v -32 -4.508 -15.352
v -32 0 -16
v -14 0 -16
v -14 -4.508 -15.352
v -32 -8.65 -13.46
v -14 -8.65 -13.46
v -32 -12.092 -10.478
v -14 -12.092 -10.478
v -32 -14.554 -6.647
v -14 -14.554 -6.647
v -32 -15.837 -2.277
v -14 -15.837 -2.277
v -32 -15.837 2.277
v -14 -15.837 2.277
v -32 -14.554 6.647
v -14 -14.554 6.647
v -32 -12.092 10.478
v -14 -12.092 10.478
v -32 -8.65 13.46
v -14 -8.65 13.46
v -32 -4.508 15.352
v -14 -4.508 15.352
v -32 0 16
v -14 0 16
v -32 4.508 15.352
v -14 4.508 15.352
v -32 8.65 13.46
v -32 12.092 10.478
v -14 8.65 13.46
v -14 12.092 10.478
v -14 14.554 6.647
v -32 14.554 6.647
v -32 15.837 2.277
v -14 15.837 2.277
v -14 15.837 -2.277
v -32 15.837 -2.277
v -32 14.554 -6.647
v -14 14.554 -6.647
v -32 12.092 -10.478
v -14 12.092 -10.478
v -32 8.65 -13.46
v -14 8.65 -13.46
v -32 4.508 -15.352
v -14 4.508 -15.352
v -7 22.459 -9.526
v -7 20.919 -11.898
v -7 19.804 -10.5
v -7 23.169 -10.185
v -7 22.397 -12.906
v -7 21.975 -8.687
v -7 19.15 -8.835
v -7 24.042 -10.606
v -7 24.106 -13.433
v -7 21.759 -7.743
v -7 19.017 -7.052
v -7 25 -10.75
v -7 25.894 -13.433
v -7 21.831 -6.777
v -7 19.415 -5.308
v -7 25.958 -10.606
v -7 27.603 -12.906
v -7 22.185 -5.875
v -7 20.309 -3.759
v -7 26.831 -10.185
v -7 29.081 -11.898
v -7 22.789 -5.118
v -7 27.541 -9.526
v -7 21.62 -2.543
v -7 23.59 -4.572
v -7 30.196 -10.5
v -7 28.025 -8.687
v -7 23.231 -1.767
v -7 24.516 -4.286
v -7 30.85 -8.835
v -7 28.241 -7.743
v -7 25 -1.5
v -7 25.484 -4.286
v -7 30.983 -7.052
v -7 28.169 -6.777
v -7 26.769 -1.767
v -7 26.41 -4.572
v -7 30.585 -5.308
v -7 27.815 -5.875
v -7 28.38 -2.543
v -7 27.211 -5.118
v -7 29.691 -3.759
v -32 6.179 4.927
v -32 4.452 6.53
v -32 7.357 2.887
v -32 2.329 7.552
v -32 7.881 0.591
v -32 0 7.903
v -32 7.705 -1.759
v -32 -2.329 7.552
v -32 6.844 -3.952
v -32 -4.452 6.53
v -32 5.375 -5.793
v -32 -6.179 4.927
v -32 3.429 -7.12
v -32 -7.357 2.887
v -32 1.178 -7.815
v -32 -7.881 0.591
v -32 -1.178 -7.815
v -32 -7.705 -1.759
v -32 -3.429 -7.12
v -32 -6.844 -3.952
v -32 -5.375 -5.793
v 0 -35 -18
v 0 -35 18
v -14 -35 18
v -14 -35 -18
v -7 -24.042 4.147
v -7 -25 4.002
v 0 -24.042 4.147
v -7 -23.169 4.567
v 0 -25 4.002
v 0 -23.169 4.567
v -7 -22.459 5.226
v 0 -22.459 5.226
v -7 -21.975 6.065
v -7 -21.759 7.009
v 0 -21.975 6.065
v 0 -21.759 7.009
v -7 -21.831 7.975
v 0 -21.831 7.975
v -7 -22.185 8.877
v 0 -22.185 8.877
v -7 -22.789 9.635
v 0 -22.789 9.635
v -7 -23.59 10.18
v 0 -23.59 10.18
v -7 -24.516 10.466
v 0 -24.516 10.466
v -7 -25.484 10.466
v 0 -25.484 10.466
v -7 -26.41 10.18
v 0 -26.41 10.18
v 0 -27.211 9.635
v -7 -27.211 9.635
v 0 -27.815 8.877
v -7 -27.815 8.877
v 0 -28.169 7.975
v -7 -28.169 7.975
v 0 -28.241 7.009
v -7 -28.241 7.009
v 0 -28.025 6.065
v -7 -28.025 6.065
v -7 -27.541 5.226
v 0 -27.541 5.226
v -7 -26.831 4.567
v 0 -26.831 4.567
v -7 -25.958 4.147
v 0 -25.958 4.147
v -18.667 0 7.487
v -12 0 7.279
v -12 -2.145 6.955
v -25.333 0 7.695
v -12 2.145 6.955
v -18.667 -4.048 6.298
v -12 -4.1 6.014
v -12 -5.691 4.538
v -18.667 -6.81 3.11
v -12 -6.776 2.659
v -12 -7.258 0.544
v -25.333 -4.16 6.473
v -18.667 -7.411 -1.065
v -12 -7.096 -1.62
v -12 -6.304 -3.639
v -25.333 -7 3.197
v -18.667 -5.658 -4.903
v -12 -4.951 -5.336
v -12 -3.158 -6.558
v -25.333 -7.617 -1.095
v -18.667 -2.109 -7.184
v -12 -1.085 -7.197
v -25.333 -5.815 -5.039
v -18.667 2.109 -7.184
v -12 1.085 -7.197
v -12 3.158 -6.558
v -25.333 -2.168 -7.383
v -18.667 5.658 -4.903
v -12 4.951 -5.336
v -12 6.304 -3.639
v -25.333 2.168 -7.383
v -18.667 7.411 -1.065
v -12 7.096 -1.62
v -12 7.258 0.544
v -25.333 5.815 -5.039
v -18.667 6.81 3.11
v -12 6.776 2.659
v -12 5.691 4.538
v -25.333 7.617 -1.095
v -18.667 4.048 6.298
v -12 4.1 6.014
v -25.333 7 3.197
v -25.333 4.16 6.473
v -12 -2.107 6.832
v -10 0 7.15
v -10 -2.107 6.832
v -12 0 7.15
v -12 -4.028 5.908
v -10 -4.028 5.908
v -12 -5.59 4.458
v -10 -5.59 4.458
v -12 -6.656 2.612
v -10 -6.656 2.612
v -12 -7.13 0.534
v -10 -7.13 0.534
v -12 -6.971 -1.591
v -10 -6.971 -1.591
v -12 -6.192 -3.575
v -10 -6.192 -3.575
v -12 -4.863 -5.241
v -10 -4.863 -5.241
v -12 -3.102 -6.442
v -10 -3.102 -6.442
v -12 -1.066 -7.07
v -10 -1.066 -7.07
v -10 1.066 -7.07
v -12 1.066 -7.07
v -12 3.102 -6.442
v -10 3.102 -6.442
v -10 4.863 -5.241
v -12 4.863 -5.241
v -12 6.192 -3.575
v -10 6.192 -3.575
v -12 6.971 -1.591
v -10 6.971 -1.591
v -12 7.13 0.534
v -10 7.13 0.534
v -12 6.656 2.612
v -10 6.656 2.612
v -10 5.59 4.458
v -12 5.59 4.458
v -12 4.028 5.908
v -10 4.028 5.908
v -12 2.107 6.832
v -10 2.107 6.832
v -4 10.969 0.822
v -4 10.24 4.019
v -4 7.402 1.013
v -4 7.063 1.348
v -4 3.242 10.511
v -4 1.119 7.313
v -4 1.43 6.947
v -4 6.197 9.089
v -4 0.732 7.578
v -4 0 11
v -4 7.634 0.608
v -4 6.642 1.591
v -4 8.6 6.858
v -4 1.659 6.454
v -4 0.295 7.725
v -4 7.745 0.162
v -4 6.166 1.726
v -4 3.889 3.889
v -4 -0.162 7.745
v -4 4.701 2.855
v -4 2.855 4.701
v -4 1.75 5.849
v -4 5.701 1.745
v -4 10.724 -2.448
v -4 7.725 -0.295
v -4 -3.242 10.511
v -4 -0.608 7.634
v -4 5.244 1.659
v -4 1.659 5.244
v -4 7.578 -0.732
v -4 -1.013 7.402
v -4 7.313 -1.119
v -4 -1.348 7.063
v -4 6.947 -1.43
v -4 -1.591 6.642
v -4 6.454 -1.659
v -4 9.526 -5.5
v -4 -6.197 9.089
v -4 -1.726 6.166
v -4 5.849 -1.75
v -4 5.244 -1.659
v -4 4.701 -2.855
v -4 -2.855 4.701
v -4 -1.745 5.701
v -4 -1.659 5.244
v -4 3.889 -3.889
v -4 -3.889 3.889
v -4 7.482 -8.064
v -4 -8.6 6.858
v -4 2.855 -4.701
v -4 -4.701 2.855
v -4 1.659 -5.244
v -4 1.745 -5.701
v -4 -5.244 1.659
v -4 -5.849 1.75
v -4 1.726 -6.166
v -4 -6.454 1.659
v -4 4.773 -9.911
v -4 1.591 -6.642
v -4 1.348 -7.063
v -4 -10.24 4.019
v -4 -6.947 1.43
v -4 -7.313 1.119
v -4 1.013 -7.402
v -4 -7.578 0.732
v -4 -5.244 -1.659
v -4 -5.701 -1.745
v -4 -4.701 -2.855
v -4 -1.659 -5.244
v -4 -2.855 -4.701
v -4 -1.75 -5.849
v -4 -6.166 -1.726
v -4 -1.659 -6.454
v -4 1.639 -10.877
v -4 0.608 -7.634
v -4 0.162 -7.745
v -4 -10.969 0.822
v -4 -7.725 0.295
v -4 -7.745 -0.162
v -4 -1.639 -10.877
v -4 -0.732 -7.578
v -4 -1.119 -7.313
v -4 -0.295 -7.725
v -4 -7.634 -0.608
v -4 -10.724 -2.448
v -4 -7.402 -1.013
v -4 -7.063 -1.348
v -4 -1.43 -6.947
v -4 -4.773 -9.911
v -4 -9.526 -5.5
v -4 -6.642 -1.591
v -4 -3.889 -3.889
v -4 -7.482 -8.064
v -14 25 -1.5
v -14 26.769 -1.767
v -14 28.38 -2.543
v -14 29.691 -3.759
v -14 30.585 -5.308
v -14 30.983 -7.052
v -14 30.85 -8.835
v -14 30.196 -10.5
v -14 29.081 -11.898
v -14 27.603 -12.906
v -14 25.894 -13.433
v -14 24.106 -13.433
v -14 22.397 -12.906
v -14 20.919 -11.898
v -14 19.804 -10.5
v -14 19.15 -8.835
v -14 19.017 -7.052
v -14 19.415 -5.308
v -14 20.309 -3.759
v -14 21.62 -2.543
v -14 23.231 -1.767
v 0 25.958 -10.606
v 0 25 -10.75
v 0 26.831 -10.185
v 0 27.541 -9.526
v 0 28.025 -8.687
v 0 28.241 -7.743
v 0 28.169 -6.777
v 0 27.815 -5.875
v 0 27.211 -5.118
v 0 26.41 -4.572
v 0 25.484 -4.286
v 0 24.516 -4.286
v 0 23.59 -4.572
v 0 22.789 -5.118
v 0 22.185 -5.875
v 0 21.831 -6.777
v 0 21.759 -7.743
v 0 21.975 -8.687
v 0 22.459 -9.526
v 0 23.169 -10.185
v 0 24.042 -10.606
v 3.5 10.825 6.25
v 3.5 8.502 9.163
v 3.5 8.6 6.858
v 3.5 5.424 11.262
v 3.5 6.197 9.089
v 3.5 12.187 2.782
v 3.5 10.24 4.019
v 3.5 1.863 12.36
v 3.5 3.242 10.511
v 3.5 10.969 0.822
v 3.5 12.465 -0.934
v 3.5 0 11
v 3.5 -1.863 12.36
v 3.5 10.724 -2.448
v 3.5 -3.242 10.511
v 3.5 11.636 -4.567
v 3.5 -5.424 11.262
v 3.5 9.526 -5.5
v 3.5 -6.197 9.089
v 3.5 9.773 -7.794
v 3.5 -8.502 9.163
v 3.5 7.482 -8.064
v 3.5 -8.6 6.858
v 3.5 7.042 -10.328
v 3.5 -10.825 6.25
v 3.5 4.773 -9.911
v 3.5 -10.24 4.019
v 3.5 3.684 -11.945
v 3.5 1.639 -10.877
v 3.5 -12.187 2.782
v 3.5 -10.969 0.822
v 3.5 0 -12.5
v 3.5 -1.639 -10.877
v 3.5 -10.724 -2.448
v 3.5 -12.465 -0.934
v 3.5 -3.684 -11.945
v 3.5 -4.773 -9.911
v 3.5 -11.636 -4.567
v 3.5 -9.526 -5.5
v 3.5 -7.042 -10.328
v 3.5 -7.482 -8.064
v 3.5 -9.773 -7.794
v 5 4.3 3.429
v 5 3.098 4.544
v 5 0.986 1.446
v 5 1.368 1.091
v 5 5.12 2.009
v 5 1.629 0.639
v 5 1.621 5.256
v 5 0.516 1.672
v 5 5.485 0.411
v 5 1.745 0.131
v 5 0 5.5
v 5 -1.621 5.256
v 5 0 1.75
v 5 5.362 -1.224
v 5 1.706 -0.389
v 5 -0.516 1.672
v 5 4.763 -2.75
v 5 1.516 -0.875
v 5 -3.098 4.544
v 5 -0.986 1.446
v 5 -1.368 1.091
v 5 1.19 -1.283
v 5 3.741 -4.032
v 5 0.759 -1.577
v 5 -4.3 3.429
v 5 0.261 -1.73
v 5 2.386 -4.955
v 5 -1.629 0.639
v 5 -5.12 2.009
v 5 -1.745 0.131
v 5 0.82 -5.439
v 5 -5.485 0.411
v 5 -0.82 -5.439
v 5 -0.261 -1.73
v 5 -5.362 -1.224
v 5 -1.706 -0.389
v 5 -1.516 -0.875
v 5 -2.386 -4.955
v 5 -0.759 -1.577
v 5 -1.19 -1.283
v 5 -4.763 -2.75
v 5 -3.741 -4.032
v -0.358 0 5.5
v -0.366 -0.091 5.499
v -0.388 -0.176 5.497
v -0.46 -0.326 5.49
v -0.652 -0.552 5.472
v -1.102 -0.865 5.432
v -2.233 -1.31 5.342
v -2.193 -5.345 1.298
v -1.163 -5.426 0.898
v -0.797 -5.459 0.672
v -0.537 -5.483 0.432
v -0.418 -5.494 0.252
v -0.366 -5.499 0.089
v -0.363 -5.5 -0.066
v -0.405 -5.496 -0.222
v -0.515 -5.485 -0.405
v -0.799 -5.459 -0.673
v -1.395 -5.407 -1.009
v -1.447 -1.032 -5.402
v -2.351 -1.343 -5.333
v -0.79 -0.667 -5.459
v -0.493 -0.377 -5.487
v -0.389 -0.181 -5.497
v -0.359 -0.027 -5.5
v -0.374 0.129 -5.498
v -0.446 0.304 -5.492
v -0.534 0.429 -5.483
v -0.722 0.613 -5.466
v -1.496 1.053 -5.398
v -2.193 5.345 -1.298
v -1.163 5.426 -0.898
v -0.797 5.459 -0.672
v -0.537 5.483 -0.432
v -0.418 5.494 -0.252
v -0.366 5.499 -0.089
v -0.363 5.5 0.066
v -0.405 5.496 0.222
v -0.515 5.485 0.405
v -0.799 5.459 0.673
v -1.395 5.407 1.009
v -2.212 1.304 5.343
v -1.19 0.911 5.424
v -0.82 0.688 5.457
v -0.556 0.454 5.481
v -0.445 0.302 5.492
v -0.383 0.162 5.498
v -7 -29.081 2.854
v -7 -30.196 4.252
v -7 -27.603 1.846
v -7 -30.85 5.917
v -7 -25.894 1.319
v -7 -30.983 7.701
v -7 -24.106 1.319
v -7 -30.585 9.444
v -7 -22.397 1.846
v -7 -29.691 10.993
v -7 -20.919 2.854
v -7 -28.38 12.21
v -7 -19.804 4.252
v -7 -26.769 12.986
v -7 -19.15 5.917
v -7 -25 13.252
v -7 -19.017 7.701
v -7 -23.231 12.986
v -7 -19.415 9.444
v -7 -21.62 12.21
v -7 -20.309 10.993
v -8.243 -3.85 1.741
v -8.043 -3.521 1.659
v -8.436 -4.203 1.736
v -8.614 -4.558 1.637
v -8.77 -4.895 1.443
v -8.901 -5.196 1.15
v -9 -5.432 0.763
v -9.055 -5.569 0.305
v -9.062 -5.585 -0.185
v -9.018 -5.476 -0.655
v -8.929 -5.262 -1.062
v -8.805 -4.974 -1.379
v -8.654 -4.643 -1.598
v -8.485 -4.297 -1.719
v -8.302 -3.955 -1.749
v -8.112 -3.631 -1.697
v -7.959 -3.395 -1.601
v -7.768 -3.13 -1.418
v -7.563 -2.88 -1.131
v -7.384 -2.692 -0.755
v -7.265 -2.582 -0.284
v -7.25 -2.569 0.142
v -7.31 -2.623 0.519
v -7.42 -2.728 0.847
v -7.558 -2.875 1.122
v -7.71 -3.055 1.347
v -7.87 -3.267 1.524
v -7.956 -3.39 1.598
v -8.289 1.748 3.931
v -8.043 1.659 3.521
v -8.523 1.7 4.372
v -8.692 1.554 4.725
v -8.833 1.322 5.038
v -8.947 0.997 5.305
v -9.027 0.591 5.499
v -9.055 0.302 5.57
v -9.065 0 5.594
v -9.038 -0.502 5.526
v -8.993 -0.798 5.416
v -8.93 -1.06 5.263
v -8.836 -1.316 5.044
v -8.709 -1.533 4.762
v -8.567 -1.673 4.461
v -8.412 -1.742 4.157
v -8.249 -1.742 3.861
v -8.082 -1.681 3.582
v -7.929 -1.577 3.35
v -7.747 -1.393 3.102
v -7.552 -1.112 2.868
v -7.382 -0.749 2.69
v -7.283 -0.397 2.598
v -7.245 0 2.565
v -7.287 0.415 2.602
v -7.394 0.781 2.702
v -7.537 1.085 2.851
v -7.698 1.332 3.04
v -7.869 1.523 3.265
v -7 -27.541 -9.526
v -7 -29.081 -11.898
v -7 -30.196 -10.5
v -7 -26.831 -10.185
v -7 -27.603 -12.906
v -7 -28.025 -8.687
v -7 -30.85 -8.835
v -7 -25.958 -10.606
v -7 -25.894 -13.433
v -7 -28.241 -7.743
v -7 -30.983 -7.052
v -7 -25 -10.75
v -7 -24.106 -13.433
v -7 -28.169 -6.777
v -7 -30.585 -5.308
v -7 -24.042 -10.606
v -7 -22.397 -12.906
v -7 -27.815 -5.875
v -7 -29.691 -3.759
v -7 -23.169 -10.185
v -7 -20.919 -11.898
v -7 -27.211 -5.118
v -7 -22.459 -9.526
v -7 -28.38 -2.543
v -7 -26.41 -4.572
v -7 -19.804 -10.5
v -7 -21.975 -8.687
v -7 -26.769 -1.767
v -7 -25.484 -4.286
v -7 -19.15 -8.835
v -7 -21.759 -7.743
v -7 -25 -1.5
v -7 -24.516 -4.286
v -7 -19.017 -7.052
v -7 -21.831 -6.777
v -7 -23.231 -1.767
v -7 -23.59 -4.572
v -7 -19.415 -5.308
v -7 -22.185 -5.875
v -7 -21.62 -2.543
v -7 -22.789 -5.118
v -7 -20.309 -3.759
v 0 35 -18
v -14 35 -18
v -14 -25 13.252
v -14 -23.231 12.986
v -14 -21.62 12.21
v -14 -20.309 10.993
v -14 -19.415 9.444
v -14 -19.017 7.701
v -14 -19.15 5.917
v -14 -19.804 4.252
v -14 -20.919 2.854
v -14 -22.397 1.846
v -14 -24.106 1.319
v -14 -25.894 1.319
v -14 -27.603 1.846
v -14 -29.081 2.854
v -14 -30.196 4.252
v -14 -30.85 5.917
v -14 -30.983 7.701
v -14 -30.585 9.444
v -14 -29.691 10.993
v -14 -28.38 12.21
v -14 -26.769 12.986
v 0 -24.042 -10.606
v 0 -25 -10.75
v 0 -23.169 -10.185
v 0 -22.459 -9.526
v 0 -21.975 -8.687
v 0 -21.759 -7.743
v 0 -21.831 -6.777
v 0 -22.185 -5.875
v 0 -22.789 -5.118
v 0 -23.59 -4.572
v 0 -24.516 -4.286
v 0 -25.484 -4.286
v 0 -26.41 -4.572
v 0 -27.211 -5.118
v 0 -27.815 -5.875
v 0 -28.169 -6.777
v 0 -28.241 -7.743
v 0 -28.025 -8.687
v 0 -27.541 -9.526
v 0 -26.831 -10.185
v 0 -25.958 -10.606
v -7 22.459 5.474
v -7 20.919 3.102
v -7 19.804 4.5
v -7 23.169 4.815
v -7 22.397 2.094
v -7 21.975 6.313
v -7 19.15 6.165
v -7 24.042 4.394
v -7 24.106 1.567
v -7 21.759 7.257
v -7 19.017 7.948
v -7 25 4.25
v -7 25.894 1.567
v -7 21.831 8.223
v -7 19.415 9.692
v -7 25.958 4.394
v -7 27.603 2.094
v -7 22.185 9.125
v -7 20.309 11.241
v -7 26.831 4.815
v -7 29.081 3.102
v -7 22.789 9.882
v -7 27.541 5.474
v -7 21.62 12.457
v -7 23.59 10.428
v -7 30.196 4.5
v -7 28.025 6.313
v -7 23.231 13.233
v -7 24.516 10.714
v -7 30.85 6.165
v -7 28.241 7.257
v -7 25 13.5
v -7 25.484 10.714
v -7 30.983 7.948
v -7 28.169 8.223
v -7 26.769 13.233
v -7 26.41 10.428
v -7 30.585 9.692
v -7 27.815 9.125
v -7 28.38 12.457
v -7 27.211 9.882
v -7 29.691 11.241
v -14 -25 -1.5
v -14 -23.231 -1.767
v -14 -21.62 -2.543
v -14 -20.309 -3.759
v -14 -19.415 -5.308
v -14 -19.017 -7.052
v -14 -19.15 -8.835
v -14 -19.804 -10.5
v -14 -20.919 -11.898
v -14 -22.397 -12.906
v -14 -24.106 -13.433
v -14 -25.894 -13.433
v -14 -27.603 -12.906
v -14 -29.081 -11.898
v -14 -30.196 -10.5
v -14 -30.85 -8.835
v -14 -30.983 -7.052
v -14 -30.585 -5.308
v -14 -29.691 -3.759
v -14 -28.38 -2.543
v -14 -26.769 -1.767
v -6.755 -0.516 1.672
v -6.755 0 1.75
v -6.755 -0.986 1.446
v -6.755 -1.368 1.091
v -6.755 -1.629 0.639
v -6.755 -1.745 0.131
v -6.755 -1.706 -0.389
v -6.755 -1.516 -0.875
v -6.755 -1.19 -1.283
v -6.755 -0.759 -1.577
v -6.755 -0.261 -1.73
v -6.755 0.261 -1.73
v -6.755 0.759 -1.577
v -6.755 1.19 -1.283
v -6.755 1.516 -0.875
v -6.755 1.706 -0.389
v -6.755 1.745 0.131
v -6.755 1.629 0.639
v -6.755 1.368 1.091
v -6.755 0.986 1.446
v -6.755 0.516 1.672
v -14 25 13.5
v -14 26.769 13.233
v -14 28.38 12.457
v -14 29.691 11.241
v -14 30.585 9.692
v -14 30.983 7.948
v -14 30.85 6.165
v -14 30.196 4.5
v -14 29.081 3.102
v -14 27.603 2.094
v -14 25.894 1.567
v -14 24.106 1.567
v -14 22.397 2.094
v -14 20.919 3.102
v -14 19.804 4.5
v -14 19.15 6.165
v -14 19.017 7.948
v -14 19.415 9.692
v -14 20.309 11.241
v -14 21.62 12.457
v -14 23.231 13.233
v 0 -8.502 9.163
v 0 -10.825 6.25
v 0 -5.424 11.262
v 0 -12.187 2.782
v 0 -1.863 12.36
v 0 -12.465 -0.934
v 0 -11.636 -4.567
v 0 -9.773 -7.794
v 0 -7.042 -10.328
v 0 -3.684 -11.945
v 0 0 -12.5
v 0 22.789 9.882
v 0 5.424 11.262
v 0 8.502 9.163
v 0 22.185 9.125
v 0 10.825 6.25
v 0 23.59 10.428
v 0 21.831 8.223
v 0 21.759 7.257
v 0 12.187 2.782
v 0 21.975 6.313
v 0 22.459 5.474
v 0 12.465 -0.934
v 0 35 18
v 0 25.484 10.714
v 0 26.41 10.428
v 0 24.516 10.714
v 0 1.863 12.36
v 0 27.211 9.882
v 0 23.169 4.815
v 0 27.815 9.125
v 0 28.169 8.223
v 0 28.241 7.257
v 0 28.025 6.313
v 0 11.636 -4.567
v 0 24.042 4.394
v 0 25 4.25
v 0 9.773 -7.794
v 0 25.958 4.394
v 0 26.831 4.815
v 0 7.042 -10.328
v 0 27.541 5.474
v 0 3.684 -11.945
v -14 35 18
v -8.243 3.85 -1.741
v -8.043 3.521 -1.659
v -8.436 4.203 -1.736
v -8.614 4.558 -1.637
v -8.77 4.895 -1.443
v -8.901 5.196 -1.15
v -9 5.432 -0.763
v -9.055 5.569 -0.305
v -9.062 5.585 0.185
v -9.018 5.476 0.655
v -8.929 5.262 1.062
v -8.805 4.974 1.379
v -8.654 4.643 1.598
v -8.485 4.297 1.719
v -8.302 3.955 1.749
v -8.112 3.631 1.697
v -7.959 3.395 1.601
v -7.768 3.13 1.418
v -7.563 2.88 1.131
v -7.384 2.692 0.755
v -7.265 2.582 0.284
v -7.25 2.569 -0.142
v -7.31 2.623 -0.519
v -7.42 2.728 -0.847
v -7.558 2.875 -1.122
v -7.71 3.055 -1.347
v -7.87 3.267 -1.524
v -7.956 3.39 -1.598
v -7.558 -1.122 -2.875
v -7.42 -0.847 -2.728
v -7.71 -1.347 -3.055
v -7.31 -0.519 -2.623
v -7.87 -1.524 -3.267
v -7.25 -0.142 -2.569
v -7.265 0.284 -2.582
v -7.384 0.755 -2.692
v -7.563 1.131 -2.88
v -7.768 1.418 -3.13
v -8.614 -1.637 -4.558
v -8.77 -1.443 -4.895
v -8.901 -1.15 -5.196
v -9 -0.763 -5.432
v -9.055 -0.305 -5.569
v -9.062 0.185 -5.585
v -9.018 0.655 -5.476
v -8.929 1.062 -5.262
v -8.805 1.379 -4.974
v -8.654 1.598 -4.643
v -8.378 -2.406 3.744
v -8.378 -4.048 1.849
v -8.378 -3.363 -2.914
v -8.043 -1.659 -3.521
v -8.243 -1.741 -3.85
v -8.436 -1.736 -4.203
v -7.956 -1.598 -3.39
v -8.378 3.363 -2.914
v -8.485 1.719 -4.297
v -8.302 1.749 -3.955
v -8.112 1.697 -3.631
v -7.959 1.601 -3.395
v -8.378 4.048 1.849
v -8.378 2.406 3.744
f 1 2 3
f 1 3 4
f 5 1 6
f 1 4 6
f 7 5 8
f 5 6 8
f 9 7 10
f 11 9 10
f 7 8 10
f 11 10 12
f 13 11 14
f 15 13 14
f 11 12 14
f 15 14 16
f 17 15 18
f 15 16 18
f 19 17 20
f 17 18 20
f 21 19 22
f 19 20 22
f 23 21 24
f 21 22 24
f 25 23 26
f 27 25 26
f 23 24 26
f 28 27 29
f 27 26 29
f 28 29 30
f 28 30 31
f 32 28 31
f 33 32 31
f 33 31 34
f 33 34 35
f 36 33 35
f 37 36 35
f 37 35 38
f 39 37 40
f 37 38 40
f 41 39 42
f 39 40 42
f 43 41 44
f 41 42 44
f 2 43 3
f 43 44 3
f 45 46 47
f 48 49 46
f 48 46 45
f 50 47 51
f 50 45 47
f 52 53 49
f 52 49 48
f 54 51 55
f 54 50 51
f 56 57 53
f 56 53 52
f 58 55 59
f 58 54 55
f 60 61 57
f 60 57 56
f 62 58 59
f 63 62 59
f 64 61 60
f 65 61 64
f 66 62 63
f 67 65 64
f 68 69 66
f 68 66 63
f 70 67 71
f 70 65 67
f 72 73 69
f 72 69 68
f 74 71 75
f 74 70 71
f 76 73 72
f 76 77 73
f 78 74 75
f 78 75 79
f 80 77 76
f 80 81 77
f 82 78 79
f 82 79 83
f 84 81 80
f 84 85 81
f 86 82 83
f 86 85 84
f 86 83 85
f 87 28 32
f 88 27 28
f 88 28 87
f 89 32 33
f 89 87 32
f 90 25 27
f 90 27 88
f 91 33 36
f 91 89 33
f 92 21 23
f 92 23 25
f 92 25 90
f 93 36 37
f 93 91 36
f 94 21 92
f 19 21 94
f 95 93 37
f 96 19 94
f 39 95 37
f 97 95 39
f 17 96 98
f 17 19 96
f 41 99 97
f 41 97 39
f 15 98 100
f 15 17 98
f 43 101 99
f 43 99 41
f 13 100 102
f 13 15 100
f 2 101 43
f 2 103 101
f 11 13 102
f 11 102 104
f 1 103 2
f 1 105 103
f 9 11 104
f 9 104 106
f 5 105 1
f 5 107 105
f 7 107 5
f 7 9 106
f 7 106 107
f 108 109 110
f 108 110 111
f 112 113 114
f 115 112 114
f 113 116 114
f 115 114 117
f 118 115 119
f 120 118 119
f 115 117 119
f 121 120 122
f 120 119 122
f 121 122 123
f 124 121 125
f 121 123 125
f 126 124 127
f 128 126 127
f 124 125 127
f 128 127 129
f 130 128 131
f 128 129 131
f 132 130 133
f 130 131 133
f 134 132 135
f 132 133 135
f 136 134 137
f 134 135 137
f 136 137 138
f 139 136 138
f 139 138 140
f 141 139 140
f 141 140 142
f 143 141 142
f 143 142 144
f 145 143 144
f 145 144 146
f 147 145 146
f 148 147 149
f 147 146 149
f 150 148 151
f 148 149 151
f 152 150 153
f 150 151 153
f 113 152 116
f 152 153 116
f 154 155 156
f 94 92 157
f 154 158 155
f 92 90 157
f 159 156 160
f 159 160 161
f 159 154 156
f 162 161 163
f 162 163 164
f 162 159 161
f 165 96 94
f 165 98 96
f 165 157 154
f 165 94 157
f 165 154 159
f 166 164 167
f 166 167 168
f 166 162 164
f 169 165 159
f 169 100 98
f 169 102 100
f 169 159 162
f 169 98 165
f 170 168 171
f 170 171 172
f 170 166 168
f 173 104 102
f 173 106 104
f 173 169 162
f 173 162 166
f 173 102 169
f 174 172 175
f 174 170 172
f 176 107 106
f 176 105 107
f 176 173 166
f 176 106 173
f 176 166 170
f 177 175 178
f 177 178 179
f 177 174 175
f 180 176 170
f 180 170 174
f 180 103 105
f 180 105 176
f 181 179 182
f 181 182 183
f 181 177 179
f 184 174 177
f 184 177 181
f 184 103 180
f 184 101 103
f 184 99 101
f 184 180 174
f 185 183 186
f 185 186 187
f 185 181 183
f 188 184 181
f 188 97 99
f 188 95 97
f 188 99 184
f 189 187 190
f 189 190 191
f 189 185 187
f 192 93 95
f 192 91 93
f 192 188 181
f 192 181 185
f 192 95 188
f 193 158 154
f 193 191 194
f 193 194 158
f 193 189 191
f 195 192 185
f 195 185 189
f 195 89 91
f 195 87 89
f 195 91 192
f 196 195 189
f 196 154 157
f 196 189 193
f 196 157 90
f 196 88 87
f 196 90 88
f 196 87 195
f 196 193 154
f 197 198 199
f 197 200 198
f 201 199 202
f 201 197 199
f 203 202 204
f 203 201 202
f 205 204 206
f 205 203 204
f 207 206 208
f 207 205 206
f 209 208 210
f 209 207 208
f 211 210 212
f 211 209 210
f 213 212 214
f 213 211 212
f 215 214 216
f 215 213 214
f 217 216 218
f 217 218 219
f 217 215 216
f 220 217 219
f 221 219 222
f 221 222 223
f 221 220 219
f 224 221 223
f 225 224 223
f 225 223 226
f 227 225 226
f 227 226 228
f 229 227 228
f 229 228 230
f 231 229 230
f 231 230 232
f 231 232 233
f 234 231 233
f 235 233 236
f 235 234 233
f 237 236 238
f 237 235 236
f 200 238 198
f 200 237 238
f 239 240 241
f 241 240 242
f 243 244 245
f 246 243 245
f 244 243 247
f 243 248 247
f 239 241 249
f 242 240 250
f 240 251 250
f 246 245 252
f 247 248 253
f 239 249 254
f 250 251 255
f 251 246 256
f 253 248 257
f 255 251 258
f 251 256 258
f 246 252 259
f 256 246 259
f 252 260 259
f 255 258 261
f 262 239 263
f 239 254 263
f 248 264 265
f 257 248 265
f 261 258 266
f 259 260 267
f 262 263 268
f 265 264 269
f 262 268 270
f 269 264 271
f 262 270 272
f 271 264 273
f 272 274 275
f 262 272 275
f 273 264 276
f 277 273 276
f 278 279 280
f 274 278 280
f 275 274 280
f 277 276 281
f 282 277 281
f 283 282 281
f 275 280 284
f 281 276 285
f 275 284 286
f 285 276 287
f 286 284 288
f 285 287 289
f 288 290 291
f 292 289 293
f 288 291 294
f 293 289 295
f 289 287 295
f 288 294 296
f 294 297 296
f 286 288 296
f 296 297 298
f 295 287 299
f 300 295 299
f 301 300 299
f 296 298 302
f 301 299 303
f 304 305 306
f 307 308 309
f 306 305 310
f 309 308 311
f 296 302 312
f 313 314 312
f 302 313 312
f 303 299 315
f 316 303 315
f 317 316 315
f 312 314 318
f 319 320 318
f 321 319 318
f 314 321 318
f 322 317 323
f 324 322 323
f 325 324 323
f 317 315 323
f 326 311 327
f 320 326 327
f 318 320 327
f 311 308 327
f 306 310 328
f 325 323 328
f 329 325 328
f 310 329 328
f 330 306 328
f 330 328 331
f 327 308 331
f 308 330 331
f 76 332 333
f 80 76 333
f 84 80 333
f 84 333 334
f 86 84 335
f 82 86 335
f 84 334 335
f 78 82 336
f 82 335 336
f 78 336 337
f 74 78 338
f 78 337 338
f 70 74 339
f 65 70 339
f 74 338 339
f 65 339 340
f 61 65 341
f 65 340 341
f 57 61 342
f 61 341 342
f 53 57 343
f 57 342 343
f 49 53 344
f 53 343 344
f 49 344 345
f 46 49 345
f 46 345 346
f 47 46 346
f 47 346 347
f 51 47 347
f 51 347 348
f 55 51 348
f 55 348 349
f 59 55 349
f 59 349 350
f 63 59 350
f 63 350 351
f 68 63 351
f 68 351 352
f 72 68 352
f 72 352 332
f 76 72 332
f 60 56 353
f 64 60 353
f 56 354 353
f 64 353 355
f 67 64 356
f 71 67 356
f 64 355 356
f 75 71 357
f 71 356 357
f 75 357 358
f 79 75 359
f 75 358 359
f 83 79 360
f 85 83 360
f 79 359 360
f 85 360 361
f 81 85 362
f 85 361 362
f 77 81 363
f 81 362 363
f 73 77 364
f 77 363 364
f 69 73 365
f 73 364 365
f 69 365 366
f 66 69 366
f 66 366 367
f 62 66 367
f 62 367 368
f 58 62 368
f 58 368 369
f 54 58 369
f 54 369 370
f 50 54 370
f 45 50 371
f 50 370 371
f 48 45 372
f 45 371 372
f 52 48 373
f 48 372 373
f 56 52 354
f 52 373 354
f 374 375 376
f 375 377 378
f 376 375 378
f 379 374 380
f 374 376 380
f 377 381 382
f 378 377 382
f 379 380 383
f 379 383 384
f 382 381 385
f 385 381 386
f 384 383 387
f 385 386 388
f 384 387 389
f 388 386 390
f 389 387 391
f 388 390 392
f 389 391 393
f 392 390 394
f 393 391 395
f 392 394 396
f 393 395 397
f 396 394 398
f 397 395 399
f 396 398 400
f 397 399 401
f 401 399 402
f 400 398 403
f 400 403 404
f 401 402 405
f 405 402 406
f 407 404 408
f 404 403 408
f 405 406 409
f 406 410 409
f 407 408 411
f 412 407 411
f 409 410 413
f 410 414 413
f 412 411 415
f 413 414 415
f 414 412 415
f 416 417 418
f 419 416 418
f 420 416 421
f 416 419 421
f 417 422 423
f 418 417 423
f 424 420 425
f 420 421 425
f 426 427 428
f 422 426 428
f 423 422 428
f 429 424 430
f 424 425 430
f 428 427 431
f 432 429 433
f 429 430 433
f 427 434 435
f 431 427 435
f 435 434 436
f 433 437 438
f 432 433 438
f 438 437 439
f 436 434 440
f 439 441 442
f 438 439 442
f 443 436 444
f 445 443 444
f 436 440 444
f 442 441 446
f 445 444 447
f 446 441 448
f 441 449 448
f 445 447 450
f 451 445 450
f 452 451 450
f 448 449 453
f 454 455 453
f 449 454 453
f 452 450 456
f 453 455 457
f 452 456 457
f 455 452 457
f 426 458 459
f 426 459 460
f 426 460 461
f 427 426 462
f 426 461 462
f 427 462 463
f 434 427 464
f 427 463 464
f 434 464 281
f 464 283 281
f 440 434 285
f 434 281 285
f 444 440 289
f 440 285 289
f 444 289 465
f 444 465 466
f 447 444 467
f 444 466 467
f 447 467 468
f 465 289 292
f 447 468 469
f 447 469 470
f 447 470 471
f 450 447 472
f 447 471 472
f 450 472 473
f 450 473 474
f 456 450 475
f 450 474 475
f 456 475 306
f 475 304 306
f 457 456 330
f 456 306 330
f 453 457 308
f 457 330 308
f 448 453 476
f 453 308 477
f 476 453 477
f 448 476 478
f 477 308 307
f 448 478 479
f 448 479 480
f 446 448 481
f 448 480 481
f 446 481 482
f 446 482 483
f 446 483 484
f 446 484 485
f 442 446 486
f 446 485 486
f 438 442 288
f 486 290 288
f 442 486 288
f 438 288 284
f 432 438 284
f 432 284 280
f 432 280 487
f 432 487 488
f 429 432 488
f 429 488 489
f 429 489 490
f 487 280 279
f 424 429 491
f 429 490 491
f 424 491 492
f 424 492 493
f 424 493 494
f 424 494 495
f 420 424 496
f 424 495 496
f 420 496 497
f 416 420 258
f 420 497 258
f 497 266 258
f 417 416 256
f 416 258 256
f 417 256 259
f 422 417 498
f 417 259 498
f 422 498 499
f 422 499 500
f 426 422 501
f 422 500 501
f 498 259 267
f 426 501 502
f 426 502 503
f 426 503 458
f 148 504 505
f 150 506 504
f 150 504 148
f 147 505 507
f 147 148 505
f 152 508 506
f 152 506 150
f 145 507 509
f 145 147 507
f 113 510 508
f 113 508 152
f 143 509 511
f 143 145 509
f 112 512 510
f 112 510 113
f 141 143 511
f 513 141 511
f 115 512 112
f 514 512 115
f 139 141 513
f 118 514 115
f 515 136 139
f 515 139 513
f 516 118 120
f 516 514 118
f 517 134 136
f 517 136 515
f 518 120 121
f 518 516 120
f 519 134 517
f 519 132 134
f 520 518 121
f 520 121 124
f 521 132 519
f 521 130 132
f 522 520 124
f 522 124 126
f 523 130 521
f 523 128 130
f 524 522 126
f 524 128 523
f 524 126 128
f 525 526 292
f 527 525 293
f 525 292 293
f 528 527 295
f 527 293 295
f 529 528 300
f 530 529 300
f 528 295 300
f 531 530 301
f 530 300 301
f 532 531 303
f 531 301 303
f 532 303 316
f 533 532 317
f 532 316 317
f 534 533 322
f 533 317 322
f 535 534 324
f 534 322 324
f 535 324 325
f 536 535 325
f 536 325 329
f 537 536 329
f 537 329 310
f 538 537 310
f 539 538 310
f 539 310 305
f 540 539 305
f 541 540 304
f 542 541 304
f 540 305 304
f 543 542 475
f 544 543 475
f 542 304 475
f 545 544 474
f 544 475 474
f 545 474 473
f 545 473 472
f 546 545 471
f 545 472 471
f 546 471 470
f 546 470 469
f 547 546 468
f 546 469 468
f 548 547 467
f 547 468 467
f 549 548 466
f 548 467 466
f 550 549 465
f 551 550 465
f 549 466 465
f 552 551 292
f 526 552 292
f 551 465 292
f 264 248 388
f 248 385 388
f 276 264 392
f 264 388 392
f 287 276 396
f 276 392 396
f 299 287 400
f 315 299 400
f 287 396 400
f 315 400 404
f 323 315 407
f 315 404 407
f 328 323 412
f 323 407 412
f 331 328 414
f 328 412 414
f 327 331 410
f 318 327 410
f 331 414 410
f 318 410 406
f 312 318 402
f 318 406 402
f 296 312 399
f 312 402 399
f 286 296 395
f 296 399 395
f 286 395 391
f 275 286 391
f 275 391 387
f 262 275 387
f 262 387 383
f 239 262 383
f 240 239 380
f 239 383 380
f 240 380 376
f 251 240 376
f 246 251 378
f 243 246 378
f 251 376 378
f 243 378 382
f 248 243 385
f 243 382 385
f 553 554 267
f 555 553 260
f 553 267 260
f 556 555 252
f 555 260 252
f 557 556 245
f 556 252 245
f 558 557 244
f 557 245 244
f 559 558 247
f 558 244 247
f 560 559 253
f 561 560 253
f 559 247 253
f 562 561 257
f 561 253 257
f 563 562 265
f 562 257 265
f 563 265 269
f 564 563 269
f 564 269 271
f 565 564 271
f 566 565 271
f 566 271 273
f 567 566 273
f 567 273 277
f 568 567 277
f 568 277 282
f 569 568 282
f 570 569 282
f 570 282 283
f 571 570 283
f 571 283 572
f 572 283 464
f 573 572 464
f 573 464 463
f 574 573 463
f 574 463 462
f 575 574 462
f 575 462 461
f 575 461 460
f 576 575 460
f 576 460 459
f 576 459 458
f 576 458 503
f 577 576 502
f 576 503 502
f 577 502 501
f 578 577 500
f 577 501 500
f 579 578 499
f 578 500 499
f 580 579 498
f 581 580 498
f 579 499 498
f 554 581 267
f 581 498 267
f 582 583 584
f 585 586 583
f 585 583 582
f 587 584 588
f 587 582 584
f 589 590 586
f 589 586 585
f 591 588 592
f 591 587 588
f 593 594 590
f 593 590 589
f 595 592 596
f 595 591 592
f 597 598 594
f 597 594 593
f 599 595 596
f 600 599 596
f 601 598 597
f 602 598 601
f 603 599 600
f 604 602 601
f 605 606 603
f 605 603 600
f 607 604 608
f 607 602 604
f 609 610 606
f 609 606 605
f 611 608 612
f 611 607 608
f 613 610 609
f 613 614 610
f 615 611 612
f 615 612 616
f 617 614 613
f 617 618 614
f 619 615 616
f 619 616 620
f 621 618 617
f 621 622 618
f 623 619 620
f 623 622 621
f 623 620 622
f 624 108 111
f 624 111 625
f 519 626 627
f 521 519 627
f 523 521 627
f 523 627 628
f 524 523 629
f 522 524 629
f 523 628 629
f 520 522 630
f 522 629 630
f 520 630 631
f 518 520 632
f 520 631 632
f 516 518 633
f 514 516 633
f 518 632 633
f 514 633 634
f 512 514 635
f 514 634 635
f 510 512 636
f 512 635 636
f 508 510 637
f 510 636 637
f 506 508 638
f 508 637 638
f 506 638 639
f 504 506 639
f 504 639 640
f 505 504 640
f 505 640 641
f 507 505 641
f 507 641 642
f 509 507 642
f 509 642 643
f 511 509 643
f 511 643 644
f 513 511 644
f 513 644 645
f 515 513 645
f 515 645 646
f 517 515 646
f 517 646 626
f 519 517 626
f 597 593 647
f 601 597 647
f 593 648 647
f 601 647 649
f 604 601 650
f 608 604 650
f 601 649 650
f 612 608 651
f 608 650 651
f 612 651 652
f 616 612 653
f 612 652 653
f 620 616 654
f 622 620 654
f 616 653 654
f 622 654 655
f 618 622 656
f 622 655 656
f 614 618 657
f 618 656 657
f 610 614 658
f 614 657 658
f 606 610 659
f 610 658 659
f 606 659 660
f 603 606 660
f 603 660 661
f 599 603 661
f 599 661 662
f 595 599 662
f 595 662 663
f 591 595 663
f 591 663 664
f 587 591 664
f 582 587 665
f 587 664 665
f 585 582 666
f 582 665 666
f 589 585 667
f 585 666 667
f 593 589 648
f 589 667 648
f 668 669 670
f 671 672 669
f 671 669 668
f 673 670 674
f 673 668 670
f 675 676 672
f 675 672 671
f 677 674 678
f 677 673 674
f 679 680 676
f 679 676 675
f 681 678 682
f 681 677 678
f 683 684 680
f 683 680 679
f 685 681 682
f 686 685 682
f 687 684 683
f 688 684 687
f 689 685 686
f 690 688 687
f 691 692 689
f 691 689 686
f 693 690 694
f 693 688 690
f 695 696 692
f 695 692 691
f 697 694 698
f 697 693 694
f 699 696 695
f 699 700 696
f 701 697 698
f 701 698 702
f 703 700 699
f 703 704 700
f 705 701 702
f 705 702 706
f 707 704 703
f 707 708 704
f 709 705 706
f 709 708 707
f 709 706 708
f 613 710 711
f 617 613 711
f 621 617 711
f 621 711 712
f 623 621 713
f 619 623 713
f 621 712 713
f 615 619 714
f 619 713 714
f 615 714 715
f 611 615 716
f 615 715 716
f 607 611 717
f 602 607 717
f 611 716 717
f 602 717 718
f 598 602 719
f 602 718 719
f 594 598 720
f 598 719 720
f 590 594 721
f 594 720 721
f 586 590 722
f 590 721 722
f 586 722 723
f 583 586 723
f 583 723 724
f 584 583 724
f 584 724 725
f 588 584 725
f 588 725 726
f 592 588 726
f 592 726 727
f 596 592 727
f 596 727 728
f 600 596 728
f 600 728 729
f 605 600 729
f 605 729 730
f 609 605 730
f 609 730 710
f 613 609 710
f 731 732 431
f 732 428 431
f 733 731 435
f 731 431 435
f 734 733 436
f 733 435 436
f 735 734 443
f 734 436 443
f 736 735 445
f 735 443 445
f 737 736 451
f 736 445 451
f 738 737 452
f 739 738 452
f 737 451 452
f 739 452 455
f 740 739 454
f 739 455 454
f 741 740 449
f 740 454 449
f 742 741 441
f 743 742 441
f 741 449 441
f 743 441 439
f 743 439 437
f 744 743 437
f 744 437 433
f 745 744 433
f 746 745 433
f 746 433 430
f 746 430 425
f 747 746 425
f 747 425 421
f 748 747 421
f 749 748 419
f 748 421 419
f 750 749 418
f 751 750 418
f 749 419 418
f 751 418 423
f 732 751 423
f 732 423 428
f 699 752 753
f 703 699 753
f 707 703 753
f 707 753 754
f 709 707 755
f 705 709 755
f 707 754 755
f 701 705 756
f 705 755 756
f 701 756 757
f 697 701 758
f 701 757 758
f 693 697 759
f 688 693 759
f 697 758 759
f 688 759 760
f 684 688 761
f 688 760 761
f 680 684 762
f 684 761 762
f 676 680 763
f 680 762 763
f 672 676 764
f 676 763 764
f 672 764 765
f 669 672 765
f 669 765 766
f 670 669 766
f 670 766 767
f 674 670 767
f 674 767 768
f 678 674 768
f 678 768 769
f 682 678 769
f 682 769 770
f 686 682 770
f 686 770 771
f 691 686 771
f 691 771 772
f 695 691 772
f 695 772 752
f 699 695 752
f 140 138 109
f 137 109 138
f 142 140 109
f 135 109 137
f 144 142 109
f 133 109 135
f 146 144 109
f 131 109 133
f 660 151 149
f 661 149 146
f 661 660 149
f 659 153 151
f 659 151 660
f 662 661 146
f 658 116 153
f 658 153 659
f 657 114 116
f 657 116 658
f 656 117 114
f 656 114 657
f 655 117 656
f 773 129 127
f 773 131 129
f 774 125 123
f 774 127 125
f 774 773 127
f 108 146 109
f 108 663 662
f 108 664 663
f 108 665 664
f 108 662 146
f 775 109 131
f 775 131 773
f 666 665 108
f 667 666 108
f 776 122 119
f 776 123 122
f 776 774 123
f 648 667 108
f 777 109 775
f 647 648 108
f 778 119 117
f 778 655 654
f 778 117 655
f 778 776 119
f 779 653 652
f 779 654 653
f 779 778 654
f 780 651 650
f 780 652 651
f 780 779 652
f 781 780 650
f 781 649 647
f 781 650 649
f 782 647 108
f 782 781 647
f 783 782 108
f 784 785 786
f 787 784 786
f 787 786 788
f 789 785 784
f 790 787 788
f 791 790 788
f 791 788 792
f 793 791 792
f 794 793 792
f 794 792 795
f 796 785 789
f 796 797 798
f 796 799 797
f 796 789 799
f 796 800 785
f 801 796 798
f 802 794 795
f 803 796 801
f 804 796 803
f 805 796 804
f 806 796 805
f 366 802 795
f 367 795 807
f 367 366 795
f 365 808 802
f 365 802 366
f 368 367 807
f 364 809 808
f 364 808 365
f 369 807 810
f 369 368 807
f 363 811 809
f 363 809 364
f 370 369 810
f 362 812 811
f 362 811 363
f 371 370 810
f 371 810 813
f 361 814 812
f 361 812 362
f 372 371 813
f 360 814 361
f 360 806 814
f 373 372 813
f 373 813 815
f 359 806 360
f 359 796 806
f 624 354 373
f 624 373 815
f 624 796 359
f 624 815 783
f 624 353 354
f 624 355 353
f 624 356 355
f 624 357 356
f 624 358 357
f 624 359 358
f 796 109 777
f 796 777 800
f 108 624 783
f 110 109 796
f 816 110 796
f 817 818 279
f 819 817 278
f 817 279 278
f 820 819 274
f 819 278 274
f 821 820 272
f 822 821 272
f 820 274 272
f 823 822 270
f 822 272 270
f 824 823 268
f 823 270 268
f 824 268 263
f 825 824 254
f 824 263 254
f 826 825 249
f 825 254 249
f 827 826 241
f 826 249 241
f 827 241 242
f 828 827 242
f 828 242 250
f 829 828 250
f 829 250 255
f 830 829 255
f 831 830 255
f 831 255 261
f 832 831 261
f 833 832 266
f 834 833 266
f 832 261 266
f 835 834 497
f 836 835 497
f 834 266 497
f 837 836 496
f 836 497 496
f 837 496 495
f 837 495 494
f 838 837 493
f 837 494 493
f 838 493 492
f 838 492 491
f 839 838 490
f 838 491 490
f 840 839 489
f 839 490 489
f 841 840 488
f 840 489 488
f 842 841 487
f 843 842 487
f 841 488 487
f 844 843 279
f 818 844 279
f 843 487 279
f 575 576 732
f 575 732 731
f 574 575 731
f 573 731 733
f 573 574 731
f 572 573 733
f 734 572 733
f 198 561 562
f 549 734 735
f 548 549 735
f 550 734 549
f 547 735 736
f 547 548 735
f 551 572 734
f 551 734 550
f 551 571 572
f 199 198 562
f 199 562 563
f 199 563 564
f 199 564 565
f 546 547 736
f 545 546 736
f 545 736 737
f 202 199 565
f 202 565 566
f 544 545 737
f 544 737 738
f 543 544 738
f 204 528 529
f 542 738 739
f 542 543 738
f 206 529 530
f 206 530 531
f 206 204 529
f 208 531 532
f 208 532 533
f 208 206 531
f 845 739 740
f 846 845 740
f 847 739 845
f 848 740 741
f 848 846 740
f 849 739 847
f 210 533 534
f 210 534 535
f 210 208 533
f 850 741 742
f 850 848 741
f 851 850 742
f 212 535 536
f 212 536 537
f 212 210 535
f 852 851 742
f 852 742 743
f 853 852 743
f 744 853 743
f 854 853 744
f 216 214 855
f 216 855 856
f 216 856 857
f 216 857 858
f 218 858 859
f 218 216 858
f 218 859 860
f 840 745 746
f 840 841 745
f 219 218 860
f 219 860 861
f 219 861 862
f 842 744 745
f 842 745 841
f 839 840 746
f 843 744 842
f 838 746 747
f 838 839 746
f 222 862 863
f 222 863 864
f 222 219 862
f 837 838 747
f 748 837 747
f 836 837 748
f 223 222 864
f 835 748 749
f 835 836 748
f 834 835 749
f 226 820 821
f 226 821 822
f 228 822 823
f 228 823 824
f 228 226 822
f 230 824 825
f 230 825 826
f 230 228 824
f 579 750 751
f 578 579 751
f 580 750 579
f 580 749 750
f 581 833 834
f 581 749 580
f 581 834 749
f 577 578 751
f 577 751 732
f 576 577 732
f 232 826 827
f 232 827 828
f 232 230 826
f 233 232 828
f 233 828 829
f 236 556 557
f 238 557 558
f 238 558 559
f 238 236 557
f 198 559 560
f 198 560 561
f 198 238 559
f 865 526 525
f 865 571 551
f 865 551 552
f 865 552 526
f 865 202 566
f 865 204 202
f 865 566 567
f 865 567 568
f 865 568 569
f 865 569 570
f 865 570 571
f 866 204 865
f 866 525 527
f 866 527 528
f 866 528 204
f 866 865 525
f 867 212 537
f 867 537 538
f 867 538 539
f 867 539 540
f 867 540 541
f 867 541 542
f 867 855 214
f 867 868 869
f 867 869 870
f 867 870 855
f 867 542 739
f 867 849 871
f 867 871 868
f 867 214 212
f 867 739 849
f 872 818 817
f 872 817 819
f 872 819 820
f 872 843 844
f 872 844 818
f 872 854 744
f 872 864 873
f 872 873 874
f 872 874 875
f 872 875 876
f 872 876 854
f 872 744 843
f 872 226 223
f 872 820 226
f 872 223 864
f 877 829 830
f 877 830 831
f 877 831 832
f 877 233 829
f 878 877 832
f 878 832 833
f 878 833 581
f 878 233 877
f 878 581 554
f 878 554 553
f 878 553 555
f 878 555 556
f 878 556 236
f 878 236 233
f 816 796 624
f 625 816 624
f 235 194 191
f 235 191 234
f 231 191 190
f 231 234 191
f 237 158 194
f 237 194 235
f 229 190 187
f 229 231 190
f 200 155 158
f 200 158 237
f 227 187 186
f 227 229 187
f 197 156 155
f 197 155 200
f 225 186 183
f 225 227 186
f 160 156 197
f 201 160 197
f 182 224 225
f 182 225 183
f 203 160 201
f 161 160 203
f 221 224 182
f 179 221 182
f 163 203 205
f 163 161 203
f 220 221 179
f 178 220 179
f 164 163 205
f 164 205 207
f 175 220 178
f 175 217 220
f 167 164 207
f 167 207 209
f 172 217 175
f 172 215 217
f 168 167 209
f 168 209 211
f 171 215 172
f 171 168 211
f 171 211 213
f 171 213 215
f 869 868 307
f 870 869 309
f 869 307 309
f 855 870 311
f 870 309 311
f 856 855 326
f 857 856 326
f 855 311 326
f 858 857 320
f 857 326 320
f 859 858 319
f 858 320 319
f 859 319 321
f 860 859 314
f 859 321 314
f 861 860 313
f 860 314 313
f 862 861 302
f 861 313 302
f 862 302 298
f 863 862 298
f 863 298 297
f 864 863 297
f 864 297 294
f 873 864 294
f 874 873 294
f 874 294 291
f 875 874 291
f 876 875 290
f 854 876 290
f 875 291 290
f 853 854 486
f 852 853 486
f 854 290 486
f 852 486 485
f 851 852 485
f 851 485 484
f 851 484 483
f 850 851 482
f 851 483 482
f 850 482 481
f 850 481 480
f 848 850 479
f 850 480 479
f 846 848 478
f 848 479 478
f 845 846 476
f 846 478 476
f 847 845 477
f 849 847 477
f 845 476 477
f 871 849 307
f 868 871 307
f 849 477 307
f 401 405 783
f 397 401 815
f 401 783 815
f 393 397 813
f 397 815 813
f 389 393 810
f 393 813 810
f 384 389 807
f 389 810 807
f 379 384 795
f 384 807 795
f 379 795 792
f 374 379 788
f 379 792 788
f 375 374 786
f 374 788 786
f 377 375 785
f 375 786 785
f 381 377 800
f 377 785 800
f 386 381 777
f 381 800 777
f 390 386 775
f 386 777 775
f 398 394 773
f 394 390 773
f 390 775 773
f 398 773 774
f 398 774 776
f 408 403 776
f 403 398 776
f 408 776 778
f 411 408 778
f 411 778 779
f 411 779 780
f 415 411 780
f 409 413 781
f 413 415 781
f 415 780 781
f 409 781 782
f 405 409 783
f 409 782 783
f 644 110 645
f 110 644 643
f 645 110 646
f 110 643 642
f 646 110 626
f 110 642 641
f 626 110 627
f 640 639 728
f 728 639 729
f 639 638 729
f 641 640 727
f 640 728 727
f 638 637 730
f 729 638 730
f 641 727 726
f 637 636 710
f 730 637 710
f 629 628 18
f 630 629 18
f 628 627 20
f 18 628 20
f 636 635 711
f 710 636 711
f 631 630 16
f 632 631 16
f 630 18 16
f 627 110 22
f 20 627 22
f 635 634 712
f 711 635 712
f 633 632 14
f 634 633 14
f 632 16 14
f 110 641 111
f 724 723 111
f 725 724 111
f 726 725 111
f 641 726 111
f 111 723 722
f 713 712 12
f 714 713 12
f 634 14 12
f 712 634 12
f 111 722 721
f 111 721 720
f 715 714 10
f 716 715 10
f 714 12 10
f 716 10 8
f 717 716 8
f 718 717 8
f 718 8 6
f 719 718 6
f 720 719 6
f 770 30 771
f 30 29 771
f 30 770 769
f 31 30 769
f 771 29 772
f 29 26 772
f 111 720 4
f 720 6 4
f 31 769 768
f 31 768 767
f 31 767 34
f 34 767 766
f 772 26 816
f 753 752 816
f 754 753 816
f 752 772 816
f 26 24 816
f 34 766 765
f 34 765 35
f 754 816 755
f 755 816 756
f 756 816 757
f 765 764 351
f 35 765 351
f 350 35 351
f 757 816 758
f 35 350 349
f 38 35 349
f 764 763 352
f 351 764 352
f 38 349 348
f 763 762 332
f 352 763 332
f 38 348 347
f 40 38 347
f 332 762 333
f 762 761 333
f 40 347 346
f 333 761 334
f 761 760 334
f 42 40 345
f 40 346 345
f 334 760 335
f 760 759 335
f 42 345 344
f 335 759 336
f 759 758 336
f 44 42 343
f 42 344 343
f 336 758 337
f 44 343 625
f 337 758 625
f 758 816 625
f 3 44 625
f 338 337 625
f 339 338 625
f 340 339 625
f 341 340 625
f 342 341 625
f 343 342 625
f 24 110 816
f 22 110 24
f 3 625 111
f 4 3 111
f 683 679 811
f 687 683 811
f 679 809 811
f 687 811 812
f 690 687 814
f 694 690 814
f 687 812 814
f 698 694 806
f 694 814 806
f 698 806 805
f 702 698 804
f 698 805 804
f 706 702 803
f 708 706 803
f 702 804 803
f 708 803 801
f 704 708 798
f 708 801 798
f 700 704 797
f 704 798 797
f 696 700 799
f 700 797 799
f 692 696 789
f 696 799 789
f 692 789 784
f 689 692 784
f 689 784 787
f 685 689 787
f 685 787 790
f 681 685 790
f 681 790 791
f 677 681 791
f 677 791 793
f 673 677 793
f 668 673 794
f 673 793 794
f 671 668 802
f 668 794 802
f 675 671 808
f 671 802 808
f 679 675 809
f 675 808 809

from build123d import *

# Parameters (mm, degrees)
ESQUISSE1_W                                     = 36
ESQUISSE1_H                                     = 70
BASE_EXTRUSION_DEPTH                            = 14
ESQUISSE10_R                                    = 16
BOSS_EXTRU_3_DEPTH                              = 18
ESQUISSE3_R                                     = 12.5
BOSS_EXTRU_2_DEPTH                              = 5
CHANFREIN1_SIZE                                 = 0.5
CHAMBRAGE_POUR_VIS_T_TE_CYLINDRIQUE_D           = 6.5
CHAMBRAGE_POUR_VIS_T_TE_CYLINDRIQUE_CBORE_D     = 12
CHAMBRAGE_POUR_VIS_T_TE_CYLINDRIQUE_CBORE_DEPTH = 7
R_P_TITION_CIRCULAIRE1_COUNT                    = 4


with BuildPart() as part:
    # Esquisse1 → Base-Extrusion (new body)
    with BuildSketch(Plane(origin=(0, 0, 0), x_dir=(0, 0, -1), z_dir=(1, 0, 0))):
        Rectangle(ESQUISSE1_W, ESQUISSE1_H)
    extrude(amount=-BASE_EXTRUSION_DEPTH)

    # Esquisse10 → Boss.-Extru.3 (add)
    with BuildSketch(Plane.ZY.offset(14)):
        Circle(ESQUISSE10_R)
    extrude(amount=BOSS_EXTRU_3_DEPTH)

    # Esquisse3 → Boss.-Extru.2 (add)
    with BuildSketch(Plane(origin=(0, 0, 0), x_dir=(0, 0, -1), z_dir=(1, 0, 0))):
        Circle(ESQUISSE3_R)
    extrude(amount=BOSS_EXTRU_2_DEPTH)

    # Chanfrein1
    chanfrein1_edges = [part.edges().sort_by_distance(p)[0] for p in [
        (5, 0, 12.5),
    ]]
    chamfer(chanfrein1_edges, length=CHANFREIN1_SIZE)

    # Chambrage pour vis à tête cylindrique à 6 pans creux (vis CHC) M51 (through all)
    with Locations(Plane.ZY.offset(14)):
        with Locations((-7.5, 25), (7.5, 25), (7.252144403, -25), (-7.5, -25)):
            CounterBoreHole(CHAMBRAGE_POUR_VIS_T_TE_CYLINDRIQUE_D / 2, CHAMBRAGE_POUR_VIS_T_TE_CYLINDRIQUE_CBORE_D / 2, CHAMBRAGE_POUR_VIS_T_TE_CYLINDRIQUE_CBORE_DEPTH)

    # Esquisse6 → Enlèvement de matière-Révolution1 (revolve, cut)
    with BuildSketch(Plane.XY):
        Polygon((-32, 1.75), (5, 1.75), (5, 5.5), (-4, 5.5), (-4, 11), (3.5, 11), (3.5, 13.852176113), (8, 13.852176113), (8, 0), (-32, 0), align=None)
    revolve(axis=Axis((0, 0, 0), (1, 0, 0)), mode=Mode.SUBTRACT)

    # Esquisse8 → Perçage1 (revolve, cut)
    with BuildSketch(Plane(origin=(-32, 0, 0), x_dir=(0, 0, 1), z_dir=(0, 1, 0))):
        Polygon((0, 0), (0, 26.296153426), (7.15, 22), (7.15, 20), (7.278667579, 20), (7.903, 0), align=None)
    revolve(axis=Axis((-38.35, 0, 0), (1, 0, 0)), mode=Mode.SUBTRACT)

    # Esquisse9 → Enlèvement de matière-Révolution2 (revolve, cut)
    with BuildSketch(Plane.XY):
        Polygon((-11.907222504, 4.382957476), (0.437240206, 9.643680185), (1.123318493, 8.033774416), (-11.221144216, 2.773051707), align=None)
    enl_vement_de_mati_re_r_volution2 = revolve(axis=Axis((-35.796822369, -7.700132197, 0), (0.9199461534250014, 0.39204473571079074, 0)), mode=Mode.SUBTRACT)

    # Répétition circulaire1: Enlèvement de matière-Révolution2 ×4 about axis
    r_p_tition_circulaire1_axis = Axis((50, 0, 0), (-1, 0, 0))
    for i in range(1, R_P_TITION_CIRCULAIRE1_COUNT):
        add(enl_vement_de_mati_re_r_volution2.rotate(r_p_tition_circulaire1_axis, i * 360 / R_P_TITION_CIRCULAIRE1_COUNT), mode=Mode.SUBTRACT)


solid = part.part
